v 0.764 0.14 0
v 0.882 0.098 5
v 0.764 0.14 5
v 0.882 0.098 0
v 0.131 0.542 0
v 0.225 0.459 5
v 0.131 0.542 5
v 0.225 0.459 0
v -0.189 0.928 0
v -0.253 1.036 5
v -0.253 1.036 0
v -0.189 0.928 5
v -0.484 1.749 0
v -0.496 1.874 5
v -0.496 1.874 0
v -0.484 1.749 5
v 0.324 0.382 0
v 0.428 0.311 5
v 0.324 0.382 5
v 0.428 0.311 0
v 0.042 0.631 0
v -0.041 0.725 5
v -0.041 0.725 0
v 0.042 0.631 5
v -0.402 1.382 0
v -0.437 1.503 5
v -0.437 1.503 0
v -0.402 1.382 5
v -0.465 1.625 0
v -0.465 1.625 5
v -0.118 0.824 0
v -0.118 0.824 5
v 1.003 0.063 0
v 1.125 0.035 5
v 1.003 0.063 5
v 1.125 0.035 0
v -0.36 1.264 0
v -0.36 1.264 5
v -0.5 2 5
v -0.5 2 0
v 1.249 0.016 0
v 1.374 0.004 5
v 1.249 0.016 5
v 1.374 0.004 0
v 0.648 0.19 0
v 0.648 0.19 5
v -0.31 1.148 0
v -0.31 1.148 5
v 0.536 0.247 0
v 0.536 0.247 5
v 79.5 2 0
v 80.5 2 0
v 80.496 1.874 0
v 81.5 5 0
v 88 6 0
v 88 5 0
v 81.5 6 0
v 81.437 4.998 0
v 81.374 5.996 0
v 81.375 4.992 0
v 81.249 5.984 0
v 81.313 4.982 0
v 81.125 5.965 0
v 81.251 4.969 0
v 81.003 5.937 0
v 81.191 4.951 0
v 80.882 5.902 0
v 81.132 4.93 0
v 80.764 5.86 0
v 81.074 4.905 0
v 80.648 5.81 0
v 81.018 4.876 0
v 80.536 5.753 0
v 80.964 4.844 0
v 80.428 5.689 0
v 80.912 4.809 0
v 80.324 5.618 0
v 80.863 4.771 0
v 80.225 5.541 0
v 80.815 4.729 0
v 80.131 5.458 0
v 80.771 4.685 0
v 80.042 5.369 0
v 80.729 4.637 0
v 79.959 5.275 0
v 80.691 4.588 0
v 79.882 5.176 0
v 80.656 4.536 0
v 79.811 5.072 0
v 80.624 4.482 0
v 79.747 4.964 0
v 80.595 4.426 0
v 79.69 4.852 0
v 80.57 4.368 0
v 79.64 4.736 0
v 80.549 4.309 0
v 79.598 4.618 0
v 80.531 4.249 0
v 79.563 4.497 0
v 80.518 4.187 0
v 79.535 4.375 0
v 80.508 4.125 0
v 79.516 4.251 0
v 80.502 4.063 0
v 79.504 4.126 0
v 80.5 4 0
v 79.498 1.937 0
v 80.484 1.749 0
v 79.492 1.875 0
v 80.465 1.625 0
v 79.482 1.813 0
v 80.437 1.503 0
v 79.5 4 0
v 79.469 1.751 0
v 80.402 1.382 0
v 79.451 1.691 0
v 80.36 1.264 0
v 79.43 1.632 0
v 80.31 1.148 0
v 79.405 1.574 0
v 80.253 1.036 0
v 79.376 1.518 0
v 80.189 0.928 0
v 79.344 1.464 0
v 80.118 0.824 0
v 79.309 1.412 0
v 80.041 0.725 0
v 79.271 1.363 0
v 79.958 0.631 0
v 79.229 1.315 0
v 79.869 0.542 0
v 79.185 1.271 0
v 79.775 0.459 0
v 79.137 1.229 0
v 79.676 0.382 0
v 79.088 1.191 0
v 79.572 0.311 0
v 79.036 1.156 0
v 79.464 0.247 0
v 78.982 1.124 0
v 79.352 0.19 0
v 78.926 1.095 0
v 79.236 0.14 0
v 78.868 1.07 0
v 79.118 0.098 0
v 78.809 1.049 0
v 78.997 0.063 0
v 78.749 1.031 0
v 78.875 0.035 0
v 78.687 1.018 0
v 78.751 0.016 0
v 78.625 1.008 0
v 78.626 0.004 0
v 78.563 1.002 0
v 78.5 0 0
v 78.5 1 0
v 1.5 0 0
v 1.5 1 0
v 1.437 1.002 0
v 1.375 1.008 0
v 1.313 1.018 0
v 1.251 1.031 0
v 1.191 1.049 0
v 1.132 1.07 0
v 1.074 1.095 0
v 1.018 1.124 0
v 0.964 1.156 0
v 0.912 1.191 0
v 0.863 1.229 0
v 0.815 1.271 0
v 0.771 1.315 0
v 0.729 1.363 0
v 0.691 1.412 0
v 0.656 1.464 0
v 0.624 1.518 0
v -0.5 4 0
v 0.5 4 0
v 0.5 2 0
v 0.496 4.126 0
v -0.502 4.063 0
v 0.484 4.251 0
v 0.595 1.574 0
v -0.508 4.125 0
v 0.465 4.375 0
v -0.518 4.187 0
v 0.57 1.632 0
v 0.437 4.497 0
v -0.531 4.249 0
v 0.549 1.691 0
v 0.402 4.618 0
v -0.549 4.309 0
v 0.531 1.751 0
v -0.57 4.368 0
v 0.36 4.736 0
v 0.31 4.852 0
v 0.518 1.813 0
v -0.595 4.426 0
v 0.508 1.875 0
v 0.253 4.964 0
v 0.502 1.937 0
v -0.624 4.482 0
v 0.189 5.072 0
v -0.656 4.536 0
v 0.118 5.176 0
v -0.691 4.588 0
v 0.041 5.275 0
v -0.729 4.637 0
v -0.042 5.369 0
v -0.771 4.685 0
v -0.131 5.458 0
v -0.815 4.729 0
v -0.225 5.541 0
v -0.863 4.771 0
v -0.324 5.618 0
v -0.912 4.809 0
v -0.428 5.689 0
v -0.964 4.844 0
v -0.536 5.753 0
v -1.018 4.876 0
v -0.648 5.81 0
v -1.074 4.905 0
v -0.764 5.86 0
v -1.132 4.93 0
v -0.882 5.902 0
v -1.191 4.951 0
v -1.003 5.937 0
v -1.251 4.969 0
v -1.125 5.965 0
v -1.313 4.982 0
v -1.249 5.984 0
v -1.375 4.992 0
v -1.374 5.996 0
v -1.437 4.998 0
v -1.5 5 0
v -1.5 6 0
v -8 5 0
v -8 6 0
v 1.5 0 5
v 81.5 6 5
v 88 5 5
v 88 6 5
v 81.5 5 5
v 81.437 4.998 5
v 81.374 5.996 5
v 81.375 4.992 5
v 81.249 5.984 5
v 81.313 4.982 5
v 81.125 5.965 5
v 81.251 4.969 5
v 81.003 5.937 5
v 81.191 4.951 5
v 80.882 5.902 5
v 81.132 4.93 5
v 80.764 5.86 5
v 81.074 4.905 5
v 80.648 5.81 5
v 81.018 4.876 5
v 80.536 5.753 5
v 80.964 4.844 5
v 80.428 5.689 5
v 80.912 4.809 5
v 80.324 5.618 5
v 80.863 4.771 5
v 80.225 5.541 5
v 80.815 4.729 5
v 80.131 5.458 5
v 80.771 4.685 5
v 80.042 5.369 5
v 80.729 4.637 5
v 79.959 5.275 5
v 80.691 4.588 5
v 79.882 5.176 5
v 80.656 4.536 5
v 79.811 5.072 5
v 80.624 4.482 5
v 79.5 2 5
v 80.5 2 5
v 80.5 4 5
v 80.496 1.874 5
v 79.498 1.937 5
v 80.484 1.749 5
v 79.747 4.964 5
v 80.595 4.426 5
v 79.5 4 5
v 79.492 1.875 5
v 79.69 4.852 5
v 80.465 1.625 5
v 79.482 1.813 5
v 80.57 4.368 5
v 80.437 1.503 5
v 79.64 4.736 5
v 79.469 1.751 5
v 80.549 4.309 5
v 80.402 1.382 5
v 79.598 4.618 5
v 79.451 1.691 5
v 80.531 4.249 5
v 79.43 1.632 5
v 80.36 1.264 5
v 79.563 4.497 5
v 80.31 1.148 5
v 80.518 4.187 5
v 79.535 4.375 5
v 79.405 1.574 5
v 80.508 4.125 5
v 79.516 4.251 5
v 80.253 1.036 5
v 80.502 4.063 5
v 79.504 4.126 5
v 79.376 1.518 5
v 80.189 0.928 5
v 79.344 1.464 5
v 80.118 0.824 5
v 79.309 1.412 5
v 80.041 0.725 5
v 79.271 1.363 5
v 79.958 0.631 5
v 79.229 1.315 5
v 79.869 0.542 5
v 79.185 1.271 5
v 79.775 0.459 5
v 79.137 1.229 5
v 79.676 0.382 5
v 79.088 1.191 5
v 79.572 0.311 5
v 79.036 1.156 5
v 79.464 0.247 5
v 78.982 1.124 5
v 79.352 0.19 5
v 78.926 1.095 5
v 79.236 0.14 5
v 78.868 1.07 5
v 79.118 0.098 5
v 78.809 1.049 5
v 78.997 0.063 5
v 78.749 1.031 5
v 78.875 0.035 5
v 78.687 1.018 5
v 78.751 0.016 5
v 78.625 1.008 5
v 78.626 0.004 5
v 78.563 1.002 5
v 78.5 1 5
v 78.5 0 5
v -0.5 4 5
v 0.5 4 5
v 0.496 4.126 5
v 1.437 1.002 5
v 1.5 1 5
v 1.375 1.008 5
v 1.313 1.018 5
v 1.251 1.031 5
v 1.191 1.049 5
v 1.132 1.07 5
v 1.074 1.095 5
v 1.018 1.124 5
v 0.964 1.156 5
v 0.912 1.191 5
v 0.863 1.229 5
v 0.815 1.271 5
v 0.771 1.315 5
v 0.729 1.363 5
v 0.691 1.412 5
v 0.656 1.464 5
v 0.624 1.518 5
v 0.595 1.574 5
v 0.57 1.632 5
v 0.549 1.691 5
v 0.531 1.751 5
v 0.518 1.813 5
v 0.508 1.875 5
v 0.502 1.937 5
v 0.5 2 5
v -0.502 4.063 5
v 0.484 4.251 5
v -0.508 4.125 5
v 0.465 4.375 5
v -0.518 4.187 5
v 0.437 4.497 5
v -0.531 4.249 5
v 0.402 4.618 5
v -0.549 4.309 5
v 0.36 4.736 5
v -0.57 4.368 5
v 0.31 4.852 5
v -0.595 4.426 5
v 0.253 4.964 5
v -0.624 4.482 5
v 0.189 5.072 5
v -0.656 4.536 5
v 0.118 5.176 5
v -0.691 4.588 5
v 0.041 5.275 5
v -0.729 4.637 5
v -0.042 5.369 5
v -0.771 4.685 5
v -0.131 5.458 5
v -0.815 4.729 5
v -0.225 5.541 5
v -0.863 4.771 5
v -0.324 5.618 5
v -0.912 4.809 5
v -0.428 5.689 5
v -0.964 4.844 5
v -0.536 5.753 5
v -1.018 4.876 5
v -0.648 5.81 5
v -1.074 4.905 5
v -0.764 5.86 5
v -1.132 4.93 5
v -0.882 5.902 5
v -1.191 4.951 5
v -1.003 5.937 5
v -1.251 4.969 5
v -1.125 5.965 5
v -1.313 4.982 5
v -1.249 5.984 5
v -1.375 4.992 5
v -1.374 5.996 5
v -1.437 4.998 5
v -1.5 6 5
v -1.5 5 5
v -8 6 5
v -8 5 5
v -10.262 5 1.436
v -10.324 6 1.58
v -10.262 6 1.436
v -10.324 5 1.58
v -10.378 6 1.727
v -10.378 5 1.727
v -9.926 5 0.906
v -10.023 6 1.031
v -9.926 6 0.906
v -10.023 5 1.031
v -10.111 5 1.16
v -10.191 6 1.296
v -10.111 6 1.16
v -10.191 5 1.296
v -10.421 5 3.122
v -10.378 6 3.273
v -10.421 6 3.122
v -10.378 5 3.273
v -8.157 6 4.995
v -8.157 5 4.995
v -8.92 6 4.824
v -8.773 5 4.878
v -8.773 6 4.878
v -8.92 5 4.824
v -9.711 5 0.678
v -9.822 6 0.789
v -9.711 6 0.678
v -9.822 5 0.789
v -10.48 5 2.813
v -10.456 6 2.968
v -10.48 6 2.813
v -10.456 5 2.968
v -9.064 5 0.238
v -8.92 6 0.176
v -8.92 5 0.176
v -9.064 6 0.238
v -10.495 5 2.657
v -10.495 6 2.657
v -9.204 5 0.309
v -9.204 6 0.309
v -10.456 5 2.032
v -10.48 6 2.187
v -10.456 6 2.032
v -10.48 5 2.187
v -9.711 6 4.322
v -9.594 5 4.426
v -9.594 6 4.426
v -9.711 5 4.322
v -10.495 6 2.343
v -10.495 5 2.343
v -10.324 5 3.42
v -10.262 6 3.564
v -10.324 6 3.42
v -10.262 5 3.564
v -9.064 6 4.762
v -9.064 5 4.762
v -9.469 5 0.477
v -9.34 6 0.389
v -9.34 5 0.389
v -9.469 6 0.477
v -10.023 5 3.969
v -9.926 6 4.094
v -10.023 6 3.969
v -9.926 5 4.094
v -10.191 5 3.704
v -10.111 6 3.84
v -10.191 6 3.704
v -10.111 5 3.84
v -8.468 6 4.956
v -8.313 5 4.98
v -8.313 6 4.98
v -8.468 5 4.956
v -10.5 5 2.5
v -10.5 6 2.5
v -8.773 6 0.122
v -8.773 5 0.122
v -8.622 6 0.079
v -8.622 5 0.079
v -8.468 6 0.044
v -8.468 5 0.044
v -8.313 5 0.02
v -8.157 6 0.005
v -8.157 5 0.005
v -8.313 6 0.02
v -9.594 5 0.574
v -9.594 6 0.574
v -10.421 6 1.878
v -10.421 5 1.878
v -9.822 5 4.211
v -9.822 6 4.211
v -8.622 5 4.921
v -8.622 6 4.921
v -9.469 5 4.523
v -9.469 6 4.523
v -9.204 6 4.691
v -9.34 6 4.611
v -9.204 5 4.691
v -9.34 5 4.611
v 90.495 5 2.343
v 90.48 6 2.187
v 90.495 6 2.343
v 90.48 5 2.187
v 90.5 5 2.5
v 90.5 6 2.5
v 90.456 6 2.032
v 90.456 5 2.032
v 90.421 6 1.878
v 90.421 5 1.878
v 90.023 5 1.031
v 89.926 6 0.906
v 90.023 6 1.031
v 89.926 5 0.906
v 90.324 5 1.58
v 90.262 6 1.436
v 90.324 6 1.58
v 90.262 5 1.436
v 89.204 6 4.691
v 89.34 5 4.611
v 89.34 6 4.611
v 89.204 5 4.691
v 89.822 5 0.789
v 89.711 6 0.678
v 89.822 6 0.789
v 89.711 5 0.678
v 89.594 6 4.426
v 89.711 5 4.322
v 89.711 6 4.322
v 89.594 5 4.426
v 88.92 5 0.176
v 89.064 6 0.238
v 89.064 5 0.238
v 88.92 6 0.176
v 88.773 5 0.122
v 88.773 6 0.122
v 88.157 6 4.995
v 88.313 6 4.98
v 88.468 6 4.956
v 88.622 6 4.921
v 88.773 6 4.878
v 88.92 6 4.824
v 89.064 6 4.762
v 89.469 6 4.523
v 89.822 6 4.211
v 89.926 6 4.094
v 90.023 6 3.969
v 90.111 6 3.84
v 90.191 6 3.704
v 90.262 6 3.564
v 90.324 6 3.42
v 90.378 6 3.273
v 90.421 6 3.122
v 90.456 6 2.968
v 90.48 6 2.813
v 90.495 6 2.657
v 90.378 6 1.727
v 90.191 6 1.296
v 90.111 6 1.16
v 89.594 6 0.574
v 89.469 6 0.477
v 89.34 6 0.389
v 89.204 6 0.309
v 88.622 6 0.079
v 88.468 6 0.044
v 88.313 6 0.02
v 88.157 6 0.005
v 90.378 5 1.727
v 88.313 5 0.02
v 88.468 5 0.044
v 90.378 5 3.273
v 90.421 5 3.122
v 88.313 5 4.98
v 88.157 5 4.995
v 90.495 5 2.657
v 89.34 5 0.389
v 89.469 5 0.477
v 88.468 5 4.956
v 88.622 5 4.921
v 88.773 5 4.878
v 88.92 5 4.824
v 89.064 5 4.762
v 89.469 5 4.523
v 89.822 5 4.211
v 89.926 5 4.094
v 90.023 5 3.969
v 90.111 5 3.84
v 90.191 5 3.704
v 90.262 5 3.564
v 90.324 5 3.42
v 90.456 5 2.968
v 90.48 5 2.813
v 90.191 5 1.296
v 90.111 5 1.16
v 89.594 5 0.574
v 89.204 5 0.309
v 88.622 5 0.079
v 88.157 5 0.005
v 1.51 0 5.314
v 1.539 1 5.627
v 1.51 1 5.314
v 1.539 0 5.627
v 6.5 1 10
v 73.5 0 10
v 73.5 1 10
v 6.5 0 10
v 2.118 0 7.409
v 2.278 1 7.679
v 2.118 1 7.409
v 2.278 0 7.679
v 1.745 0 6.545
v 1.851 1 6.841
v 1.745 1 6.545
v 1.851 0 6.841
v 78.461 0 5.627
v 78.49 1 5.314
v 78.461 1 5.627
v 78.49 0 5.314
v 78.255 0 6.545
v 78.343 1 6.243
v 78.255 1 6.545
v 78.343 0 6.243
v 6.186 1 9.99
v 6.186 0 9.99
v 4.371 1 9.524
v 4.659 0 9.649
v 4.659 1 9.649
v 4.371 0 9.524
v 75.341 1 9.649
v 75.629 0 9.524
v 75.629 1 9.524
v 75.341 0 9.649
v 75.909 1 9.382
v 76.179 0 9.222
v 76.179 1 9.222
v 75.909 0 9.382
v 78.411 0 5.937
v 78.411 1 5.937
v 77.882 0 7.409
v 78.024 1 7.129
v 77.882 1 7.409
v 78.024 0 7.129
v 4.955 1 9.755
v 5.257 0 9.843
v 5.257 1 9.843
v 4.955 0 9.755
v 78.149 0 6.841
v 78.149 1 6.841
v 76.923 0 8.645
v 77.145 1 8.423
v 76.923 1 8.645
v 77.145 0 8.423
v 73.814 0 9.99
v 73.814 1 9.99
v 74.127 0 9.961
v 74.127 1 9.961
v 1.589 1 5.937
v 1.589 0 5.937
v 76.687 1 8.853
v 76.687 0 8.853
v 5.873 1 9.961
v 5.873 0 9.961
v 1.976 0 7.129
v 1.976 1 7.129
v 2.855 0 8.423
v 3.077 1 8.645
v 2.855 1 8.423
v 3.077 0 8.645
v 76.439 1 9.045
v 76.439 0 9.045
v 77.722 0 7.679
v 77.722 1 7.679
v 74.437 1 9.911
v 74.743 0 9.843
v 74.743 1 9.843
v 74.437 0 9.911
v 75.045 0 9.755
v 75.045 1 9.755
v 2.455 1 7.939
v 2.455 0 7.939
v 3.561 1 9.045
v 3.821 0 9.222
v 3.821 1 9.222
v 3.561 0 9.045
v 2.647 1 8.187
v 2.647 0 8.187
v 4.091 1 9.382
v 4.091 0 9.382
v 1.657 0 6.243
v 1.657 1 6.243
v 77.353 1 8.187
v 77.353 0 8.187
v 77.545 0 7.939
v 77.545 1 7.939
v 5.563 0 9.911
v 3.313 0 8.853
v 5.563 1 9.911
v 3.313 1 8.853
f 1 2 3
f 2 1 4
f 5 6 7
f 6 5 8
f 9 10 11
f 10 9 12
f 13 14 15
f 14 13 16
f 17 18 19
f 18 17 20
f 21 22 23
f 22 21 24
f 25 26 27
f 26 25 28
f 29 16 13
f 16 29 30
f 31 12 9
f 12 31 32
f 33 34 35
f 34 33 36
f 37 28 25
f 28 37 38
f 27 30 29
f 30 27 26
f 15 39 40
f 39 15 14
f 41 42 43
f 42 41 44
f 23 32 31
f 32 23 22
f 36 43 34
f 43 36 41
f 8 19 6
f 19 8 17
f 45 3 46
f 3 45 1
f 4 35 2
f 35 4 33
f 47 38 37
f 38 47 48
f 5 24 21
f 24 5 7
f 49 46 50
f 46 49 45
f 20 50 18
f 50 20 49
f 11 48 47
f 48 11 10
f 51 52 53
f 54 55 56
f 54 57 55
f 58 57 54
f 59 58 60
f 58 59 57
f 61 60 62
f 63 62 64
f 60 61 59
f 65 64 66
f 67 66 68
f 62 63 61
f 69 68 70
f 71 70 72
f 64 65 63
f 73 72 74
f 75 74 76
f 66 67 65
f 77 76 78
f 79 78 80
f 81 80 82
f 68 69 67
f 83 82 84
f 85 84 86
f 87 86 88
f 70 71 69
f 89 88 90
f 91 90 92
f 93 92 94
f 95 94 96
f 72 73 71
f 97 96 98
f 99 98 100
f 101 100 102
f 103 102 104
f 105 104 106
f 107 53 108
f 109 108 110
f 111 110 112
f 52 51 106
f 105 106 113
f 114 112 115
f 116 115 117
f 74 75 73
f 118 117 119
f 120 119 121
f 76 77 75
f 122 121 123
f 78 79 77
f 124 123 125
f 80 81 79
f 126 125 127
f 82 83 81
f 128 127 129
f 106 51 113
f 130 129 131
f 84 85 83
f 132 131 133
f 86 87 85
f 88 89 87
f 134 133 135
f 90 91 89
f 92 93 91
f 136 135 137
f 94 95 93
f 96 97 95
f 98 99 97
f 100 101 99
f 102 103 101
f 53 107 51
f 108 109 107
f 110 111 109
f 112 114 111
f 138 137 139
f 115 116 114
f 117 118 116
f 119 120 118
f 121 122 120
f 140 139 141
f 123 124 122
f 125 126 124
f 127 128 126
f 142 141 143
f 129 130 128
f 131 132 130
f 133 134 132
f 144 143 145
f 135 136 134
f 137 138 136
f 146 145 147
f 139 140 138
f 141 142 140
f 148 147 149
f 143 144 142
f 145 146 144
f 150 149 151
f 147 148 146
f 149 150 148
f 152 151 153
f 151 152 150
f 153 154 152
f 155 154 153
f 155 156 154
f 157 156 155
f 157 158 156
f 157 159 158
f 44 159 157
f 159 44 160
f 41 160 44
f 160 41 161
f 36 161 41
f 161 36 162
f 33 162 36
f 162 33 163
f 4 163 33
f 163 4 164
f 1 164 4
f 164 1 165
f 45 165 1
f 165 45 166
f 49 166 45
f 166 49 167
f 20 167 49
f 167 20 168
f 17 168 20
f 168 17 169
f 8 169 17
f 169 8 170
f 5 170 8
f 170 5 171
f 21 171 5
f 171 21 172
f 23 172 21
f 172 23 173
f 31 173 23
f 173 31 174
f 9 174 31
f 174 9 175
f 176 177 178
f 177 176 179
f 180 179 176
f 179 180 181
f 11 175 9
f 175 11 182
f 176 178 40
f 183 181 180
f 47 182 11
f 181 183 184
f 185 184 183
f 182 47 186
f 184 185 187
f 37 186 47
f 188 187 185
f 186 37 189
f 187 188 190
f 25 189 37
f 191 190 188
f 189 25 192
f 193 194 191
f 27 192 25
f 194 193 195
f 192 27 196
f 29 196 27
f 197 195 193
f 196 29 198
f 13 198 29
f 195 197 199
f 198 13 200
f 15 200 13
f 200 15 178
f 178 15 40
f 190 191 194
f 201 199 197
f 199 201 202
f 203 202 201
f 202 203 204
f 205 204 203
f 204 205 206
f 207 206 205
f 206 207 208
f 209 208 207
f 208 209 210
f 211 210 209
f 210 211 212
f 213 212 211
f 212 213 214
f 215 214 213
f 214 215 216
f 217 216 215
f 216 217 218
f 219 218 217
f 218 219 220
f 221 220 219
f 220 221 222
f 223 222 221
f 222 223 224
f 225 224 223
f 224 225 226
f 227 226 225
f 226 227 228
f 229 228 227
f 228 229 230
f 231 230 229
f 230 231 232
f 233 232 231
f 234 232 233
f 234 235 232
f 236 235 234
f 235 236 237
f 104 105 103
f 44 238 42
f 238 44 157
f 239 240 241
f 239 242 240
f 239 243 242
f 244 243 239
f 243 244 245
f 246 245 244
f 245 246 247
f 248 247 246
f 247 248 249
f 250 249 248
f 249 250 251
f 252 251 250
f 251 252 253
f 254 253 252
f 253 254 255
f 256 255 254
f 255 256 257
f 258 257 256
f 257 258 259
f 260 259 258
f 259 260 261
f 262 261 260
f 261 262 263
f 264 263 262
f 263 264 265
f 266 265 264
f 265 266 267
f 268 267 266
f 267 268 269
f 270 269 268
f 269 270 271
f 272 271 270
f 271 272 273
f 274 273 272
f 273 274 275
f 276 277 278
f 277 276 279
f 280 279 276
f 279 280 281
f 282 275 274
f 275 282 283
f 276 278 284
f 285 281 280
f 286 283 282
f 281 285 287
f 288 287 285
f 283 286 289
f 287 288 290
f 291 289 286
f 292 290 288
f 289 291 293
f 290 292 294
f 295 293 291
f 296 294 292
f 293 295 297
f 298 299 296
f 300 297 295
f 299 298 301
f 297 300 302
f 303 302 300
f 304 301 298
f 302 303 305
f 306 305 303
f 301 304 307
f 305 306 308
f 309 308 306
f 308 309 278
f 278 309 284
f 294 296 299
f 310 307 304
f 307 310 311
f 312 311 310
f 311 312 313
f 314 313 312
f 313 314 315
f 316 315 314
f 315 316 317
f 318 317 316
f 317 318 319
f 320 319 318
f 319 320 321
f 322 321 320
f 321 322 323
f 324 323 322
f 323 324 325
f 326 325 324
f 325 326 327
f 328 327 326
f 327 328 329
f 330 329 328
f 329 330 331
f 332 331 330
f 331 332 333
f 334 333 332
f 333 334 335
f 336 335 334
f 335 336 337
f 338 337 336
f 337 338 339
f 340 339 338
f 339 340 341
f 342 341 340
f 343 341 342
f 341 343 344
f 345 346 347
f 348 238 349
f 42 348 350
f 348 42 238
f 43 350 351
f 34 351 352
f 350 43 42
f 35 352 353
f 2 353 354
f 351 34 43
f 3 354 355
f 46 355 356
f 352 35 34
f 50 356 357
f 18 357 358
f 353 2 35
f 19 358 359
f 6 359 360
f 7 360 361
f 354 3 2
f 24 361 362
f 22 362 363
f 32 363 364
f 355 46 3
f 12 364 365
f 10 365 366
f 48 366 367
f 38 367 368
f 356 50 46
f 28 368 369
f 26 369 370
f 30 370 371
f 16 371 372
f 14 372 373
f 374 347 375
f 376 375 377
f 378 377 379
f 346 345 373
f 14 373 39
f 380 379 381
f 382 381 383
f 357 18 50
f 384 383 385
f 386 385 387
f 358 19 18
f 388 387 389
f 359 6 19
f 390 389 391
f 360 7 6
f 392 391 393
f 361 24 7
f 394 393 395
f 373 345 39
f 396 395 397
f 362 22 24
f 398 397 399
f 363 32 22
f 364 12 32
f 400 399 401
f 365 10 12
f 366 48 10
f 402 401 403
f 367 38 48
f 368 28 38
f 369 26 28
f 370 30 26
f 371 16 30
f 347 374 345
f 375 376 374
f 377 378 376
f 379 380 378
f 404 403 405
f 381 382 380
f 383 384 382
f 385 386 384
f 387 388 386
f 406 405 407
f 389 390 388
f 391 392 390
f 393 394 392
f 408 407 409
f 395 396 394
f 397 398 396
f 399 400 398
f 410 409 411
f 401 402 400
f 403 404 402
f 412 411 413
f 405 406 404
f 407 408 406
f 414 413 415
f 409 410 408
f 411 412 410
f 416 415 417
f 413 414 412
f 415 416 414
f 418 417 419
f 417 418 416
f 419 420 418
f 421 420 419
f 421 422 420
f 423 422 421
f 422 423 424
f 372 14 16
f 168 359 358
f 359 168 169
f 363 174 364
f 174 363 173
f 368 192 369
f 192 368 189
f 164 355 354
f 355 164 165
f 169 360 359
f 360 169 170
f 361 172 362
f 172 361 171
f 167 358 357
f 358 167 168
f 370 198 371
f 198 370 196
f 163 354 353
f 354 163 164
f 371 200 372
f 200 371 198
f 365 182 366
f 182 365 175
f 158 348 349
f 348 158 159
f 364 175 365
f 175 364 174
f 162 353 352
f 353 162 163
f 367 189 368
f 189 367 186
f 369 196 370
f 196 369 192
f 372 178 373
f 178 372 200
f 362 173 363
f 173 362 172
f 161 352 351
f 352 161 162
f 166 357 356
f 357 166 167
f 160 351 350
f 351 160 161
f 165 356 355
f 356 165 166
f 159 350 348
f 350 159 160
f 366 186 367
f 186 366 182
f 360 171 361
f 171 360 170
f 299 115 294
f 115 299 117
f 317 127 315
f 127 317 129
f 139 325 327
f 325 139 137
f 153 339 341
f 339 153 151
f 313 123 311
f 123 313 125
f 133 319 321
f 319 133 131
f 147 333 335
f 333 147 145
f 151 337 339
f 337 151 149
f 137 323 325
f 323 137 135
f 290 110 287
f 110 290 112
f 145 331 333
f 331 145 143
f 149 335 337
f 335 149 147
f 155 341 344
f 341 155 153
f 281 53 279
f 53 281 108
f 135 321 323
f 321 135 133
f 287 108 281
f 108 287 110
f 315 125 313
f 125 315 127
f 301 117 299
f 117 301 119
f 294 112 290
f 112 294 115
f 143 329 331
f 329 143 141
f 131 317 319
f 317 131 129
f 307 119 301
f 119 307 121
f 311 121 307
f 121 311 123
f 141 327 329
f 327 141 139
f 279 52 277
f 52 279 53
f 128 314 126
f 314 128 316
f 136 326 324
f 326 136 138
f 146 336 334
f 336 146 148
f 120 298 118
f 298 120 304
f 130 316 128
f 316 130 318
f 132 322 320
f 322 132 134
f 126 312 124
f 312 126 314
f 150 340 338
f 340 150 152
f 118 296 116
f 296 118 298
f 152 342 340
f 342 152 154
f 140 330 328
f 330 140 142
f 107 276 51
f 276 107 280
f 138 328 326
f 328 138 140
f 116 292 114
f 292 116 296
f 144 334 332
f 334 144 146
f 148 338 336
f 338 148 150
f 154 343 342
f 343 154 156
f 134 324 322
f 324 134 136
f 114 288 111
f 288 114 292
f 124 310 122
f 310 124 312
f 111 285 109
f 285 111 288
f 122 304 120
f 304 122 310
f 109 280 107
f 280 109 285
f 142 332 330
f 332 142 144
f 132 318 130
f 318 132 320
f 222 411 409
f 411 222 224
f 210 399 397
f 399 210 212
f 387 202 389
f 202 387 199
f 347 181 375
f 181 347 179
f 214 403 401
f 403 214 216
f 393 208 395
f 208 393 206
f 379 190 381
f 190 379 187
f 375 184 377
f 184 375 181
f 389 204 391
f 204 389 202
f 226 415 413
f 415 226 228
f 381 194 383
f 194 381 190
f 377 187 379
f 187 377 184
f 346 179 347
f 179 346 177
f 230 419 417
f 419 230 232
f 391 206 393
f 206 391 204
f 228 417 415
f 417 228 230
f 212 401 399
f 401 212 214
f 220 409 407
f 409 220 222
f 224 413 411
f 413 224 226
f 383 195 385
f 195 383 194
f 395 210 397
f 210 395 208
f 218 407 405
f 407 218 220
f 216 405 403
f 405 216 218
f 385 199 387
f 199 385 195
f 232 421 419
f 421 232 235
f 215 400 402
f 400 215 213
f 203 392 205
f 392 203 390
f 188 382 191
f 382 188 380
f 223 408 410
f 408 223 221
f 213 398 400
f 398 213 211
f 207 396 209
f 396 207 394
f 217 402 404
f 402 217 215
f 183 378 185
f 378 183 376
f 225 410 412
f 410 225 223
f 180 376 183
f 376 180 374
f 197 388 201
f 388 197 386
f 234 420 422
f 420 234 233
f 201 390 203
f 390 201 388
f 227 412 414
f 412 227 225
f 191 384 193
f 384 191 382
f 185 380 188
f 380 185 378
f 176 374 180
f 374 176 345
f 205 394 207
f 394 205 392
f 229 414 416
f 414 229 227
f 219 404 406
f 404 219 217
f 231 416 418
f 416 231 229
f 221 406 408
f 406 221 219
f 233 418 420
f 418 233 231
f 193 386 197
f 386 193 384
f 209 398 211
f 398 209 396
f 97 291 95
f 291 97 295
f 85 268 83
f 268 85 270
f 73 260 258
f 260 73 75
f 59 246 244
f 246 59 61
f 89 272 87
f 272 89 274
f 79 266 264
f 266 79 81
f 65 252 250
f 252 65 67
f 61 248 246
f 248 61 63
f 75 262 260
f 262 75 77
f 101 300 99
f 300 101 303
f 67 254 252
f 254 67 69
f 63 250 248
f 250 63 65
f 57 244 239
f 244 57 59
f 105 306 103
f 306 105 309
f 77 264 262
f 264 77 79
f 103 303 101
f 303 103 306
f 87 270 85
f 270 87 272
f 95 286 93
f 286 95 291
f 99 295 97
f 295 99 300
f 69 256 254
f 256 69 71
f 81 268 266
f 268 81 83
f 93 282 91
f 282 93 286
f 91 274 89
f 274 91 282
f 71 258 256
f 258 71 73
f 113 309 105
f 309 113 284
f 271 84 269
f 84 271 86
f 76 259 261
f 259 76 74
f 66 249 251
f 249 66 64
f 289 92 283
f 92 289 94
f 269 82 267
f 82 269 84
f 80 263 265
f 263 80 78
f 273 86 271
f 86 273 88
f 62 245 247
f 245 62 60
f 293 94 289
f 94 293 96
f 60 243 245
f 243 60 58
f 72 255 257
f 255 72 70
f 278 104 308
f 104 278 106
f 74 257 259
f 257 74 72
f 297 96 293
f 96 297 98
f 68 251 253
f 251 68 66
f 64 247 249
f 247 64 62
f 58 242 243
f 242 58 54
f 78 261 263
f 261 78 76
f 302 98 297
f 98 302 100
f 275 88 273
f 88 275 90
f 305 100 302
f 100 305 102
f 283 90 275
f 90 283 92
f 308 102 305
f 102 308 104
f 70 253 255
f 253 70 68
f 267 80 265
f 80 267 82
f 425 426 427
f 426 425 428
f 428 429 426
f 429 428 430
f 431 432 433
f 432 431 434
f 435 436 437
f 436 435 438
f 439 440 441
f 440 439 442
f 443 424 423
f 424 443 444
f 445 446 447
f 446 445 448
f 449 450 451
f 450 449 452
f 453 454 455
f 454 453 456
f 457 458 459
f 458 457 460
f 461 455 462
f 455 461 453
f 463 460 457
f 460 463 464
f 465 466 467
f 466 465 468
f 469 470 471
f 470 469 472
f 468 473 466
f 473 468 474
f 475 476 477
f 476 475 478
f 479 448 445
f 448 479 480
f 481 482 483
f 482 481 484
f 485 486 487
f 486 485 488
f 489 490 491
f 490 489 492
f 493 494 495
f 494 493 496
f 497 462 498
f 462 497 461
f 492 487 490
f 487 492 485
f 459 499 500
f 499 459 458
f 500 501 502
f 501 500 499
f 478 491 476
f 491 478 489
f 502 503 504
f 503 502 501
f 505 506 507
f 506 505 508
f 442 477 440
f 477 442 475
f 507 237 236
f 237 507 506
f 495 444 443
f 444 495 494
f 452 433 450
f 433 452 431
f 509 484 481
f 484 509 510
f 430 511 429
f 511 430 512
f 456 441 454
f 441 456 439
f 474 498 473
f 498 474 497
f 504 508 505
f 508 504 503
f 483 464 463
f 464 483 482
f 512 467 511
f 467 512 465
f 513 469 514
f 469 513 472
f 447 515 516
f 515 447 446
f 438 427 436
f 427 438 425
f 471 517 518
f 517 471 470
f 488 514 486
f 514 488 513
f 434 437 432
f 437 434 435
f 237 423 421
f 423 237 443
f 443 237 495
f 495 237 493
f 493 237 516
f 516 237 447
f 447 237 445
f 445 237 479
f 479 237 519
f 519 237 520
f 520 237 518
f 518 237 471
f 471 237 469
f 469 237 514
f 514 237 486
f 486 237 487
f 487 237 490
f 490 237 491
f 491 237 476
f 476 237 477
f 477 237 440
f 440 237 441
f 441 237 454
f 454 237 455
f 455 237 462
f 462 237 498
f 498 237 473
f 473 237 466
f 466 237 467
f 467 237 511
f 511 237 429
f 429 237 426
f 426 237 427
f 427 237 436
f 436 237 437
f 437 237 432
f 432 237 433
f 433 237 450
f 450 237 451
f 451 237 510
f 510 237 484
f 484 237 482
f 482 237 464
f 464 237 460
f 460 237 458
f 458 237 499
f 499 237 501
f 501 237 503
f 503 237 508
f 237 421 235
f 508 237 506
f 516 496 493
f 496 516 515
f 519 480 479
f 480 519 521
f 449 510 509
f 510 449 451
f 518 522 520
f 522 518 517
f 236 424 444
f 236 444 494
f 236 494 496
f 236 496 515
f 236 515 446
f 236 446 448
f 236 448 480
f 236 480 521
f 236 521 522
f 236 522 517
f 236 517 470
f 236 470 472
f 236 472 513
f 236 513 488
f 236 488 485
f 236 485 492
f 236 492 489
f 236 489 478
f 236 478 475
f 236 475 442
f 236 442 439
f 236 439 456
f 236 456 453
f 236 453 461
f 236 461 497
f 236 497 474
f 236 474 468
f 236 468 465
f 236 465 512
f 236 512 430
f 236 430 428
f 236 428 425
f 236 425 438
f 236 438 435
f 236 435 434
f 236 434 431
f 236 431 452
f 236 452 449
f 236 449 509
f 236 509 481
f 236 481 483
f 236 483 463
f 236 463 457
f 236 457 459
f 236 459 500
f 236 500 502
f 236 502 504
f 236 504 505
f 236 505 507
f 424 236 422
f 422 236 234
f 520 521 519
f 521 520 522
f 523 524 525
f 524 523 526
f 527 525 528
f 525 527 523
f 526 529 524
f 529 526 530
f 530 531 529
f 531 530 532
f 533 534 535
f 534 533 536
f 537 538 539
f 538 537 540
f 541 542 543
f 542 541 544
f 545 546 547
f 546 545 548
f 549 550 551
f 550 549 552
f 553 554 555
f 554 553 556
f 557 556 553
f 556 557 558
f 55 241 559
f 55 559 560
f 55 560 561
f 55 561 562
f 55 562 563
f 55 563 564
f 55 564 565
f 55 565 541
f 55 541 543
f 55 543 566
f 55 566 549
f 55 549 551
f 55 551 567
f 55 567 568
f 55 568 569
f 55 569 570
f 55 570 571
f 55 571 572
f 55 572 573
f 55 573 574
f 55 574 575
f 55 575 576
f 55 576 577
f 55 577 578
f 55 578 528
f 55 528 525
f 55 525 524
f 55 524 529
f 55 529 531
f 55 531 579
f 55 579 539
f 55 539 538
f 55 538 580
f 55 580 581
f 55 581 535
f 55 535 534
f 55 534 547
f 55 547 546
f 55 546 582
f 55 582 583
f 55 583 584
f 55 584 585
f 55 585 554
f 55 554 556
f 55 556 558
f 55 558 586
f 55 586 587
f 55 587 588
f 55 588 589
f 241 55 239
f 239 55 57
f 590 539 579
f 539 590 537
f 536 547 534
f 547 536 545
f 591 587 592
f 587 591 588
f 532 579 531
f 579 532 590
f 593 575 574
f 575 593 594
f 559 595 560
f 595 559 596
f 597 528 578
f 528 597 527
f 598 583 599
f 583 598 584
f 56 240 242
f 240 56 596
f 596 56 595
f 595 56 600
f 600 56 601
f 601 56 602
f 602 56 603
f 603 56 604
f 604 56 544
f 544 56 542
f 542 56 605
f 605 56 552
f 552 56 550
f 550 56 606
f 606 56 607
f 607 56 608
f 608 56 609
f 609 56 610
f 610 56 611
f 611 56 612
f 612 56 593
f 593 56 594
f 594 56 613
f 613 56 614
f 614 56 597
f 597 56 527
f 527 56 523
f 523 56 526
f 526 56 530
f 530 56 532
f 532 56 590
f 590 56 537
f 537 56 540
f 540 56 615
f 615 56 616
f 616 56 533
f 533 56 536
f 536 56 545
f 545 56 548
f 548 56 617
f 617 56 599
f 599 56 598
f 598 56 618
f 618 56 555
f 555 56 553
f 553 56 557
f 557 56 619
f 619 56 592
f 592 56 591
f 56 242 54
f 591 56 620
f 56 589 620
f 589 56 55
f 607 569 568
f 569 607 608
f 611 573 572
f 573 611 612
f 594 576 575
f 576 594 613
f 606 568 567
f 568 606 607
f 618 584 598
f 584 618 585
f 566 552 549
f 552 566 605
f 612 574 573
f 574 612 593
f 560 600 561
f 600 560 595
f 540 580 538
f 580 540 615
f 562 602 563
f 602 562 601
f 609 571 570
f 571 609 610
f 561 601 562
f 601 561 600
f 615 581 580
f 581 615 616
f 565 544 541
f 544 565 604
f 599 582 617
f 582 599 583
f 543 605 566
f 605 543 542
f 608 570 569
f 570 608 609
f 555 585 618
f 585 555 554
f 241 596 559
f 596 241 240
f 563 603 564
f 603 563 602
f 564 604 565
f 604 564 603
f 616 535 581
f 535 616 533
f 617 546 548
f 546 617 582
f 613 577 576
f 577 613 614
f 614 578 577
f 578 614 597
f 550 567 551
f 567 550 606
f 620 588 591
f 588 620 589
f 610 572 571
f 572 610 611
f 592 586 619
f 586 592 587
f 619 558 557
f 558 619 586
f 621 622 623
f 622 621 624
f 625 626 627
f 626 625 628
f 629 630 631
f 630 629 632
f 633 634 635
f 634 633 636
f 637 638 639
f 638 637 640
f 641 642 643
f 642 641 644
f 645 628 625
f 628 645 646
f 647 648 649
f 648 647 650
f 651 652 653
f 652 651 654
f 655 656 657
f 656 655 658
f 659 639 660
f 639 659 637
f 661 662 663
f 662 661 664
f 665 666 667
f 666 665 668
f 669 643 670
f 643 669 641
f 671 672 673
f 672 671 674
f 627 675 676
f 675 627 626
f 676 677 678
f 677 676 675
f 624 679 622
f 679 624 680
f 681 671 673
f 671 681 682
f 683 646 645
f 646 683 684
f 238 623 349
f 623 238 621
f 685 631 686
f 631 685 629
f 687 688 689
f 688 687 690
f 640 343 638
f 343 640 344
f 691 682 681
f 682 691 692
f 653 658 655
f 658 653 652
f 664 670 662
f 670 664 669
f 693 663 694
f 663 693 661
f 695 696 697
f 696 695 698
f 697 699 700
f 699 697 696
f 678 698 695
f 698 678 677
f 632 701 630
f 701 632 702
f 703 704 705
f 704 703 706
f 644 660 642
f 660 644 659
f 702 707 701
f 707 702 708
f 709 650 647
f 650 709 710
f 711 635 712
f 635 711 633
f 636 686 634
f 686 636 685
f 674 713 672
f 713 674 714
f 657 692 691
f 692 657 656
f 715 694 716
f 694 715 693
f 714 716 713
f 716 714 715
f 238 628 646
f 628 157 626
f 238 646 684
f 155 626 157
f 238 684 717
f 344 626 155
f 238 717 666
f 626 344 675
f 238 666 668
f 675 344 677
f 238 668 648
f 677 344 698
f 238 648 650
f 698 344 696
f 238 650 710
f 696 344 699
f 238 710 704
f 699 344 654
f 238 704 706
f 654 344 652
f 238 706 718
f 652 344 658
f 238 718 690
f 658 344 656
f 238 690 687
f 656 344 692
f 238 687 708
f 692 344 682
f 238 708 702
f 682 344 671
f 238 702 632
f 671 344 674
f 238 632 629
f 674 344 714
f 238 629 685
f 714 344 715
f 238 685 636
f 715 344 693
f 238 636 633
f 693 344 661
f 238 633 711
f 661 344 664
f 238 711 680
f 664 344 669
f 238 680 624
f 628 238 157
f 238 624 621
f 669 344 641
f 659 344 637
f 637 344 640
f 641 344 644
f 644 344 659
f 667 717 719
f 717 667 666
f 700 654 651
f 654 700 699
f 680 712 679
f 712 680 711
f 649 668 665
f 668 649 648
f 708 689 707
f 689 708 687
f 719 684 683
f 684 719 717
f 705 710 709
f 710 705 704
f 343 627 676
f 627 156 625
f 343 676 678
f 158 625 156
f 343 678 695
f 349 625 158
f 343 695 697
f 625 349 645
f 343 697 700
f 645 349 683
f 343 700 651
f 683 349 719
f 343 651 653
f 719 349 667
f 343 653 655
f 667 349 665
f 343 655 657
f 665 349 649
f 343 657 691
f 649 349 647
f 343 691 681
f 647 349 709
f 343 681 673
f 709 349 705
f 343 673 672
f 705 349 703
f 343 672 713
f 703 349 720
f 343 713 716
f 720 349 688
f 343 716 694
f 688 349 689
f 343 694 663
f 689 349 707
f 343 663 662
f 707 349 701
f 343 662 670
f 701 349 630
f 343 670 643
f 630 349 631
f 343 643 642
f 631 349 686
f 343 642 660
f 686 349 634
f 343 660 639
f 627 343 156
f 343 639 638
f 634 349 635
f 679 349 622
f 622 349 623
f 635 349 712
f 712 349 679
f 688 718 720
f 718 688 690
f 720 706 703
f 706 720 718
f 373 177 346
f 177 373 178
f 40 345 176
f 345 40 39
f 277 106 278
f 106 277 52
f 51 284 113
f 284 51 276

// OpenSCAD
// -----------------------------------------------------
//  Schnellhefter / Filing Strip
//
//  Detlev Ahlgrimm, 18.03.2019
// -----------------------------------------------------

lochabstand=80;         // [40:0.1:100]
lochdurchmesser=6;      // [4:0.1:10]
staerke=1.0;            // [0.5:0.05:2]
halte_hoehe=4;          // [2:0.1:20]
laenge_nase=10;         // [5:20]
breite_ruecken=10;      // [4:20]
nasen_nach_aussen=1;    // [0:False, 1:True]

/* [Hidden] */
$fn=100;
breite_durchschub=lochdurchmesser-1;

// -----------------------------------------------------
//  ra  : Aussenradius
//  ri  : Innenradius
//  h   : Hoehe
//  a   : Oeffnungswinkel
// -----------------------------------------------------
module RohrTeil(ra, ri, h, a) {
  da=2*ra;
  difference() {
    cylinder(r=ra, h=h);
    translate([0, 0, -0.1]) cylinder(r=ri, h=h+0.2);
    if(a<=90)       translate([0, 0, -0.1]) linear_extrude(h+0.2) polygon([[0,0], [0,da], [da,da],                                [sin(a)*ra, cos(a)*ra]]);
    else if(a<=180) translate([0, 0, -0.1]) linear_extrude(h+0.2) polygon([[0,0], [0,da], [da,da], [da,-da],                      [sin(a)*ra, cos(a)*ra]]);
    else if(a<=270) translate([0, 0, -0.1]) linear_extrude(h+0.2) polygon([[0,0], [0,da], [da,da], [da,-da], [-da,-da],           [sin(a)*ra, cos(a)*ra]]);
    else            translate([0, 0, -0.1]) linear_extrude(h+0.2) polygon([[0,0], [0,da], [da,da], [da,-da], [-da,-da], [-da,da], [sin(a)*ra, cos(a)*ra]]);
  }
}

// -----------------------------------------------------
//
// -----------------------------------------------------
module hefter(r=2) {
  la=lochabstand+staerke;
  hull() {
    translate([     breite_ruecken/2+r, 0, breite_ruecken/2]) rotate([-90, 0, 0]) cylinder(d=breite_ruecken, h=staerke);
    translate([la-(breite_ruecken/2+r), 0, breite_ruecken/2]) rotate([-90, 0, 0]) cylinder(d=breite_ruecken, h=staerke);
  }
  d=r-staerke;
  translate([   r, r, 0]) rotate([0, 0,  90]) RohrTeil(r, d, breite_durchschub, 270);
  translate([la-r, r, 0]) rotate([0, 0, 180]) RohrTeil(r, d, breite_durchschub, 270);
  translate([r, 0, 0]) cube([la-2*r, staerke, breite_durchschub]);

  translate([         0, r, 0]) cube([staerke, halte_hoehe-2*d, breite_durchschub]);
  translate([la-staerke, r, 0]) cube([staerke, halte_hoehe-2*d, breite_durchschub]);

  if(nasen_nach_aussen==1) {
    translate([  -r+staerke, staerke+halte_hoehe-d, 0]) rotate([0, 0, 270]) RohrTeil(r, r-staerke, breite_durchschub, 270);
    translate([la-staerke+r, staerke+halte_hoehe-d, 0]) rotate([0, 0,   0]) RohrTeil(r, r-staerke, breite_durchschub, 270);

    translate([  -laenge_nase+breite_durchschub/2, staerke+halte_hoehe, breite_durchschub/2]) rotate([-90, 0, 0]) cylinder(d=breite_durchschub, h=staerke);
    translate([la+laenge_nase-breite_durchschub/2, staerke+halte_hoehe, breite_durchschub/2]) rotate([-90, 0, 0]) cylinder(d=breite_durchschub, h=staerke);
    
    translate([-laenge_nase+breite_durchschub/2, staerke+halte_hoehe, 0]) cube([laenge_nase-breite_durchschub/2-r+staerke, staerke, breite_durchschub]);
    translate([                    la+r-staerke, staerke+halte_hoehe, 0]) cube([laenge_nase-breite_durchschub/2-r+staerke, staerke, breite_durchschub]);
  } else {
    translate([   r, staerke+halte_hoehe-d, 0]) rotate([0, 0,   0]) RohrTeil(r, r-staerke, breite_durchschub, 270);
    translate([la-r, staerke+halte_hoehe-d, 0]) rotate([0, 0, 270]) RohrTeil(r, r-staerke, breite_durchschub, 270);

    translate([   laenge_nase-breite_durchschub/2, staerke+halte_hoehe, breite_durchschub/2]) rotate([-90, 0, 0]) cylinder(d=breite_durchschub, h=staerke);
    translate([la-laenge_nase+breite_durchschub/2, staerke+halte_hoehe, breite_durchschub/2]) rotate([-90, 0, 0]) cylinder(d=breite_durchschub, h=staerke);

    translate([                                 r, staerke+halte_hoehe, 0]) cube([laenge_nase-breite_durchschub/2-r, staerke, breite_durchschub]);
    translate([la-laenge_nase+breite_durchschub/2, staerke+halte_hoehe, 0]) cube([laenge_nase-breite_durchschub/2-r, staerke, breite_durchschub]);
  }
}
translate([-staerke/2, 0, 0]) hefter();

//%translate([0, staerke, 0]) cube([lochabstand, halte_hoehe, lochdurchmesser]);
